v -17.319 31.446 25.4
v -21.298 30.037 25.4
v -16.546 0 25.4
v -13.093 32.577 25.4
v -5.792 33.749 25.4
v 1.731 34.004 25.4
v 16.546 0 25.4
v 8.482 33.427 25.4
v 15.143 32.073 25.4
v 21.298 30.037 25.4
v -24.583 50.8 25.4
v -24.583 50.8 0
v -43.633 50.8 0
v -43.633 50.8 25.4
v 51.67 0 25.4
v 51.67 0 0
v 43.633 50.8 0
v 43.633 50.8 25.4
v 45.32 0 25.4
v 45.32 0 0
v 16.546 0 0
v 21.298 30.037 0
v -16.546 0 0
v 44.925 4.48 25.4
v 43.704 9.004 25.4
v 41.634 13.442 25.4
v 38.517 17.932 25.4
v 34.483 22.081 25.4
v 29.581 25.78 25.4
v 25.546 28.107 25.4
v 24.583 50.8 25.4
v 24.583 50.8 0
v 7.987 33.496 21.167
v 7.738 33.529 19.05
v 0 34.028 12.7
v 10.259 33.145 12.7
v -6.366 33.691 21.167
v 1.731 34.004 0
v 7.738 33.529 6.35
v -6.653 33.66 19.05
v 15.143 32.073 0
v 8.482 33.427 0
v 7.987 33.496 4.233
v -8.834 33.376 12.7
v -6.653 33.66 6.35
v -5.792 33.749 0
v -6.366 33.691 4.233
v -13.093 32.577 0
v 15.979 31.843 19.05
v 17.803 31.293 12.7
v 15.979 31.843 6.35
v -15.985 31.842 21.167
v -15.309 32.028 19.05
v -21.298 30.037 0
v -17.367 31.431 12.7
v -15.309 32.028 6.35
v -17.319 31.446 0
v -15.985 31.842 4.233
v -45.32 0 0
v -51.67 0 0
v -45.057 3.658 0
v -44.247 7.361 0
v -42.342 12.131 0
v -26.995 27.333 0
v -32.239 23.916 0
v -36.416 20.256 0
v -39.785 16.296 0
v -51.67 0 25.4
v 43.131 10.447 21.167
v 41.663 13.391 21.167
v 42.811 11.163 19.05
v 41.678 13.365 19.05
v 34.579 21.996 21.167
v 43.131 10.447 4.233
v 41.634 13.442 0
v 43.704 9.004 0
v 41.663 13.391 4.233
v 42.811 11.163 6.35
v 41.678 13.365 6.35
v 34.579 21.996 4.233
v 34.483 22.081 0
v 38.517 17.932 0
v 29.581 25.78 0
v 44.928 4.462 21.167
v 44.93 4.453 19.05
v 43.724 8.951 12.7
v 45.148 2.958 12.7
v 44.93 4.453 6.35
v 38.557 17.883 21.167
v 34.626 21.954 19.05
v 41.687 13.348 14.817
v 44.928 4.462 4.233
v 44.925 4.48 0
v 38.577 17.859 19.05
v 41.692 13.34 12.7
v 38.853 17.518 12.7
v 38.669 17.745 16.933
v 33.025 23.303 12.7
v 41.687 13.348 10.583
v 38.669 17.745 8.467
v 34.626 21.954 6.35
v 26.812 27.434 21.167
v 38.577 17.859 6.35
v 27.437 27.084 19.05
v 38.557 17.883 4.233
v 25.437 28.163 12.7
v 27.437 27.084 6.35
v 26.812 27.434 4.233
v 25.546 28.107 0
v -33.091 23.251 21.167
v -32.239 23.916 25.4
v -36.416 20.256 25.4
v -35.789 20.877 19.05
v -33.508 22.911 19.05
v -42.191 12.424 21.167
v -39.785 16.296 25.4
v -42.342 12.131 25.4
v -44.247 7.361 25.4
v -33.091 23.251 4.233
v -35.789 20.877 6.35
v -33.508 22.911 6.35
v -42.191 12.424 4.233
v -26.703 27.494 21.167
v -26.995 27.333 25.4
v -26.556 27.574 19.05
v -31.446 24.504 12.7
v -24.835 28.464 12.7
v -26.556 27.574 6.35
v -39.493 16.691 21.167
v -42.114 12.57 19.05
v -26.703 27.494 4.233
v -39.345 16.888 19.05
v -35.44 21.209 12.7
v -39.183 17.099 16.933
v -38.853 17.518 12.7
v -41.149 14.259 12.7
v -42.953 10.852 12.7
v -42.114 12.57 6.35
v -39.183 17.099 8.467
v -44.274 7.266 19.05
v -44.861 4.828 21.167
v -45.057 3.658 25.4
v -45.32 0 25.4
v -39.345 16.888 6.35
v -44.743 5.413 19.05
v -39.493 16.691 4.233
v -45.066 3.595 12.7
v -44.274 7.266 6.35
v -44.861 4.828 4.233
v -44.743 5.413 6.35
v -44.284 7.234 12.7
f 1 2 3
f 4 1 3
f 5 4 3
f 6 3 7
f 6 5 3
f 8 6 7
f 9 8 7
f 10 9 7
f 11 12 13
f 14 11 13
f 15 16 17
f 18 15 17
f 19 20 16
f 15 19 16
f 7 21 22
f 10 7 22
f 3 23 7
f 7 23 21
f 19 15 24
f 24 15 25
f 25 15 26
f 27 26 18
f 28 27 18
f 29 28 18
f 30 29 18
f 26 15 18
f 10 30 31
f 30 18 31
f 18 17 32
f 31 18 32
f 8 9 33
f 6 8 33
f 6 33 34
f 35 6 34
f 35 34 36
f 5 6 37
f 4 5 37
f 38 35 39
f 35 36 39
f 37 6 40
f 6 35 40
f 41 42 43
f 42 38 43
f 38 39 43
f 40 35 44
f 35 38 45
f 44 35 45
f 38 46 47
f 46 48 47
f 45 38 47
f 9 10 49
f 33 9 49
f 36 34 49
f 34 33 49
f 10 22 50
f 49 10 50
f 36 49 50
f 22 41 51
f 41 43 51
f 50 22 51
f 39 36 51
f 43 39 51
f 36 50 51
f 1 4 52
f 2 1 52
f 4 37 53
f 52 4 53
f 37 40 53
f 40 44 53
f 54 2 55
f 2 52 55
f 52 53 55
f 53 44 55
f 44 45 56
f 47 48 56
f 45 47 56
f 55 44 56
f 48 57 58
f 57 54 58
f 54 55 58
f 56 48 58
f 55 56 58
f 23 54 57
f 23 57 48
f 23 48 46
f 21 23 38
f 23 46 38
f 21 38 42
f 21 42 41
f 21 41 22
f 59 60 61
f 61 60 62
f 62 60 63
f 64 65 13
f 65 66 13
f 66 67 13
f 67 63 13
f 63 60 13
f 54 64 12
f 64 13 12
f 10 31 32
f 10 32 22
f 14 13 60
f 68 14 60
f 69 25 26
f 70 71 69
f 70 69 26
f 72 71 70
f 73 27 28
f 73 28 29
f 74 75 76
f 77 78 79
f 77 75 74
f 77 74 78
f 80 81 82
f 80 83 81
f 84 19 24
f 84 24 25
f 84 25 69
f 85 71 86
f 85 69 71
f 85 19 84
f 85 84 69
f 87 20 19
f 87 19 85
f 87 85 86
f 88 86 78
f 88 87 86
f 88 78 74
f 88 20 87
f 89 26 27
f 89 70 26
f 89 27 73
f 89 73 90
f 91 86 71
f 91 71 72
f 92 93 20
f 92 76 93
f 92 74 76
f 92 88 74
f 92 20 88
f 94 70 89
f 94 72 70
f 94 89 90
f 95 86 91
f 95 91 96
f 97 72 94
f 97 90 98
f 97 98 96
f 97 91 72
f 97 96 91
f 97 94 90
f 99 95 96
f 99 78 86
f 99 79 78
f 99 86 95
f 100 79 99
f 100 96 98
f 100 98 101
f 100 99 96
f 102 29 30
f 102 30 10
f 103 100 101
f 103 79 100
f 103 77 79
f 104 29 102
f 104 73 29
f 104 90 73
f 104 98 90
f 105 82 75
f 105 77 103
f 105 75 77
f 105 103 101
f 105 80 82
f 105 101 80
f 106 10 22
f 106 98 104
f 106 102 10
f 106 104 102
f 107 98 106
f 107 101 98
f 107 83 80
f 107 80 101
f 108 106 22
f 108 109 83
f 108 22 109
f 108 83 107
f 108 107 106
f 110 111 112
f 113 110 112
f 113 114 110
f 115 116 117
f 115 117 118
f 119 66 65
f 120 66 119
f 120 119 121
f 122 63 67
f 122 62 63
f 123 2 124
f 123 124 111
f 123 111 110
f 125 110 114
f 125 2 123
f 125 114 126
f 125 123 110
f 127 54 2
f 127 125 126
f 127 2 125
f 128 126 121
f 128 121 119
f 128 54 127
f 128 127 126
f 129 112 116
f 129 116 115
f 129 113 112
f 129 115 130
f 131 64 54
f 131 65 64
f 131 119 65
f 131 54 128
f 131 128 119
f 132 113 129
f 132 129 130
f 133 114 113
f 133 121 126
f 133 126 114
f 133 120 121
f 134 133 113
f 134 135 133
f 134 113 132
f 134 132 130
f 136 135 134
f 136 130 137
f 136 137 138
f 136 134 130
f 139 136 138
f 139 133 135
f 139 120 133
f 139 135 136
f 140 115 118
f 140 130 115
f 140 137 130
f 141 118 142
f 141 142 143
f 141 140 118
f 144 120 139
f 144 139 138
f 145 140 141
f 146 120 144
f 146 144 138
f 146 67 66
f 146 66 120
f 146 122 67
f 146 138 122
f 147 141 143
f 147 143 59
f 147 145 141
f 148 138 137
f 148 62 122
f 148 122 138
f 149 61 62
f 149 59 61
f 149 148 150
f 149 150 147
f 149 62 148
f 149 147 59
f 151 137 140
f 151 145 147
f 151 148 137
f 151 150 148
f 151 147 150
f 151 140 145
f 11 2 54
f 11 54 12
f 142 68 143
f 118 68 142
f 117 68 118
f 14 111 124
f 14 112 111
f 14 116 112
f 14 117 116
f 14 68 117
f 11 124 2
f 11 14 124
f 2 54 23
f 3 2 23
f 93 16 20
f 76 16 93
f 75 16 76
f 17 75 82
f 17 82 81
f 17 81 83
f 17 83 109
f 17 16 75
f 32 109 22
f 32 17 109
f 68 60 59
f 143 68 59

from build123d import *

# Parameters (mm, degrees)
F1_DEPTH = 25.4


with BuildPart() as f1:
    # F0 (on Top) → F1 (new body)
    with BuildSketch(Plane.XY):
        with BuildLine():
            Line((-43.632869, 50.8), (-51.669617, 0))
            Line((-51.669617, 0), (-45.319617, 0))
            add(Edge.make_bspline(
                [(-21.298033, 30.036661), (-45.319617, 20.433774), (-45.319617, 0)],
                knots=[2.060032, 2.060032, 2.060032, 3.141593, 3.141593, 3.141593], degree=2, weights=[1, 0.857307, 1]))
            Line((-21.298033, 30.036661), (-24.582869, 50.8))
            Line((-24.582869, 50.8), (-43.632869, 50.8))
        make_face()
        with BuildLine():
            Line((-21.298033, 30.036661), (-16.546122, 0))
            Line((-16.546122, 0), (16.546122, 0))
            Line((16.546122, 0), (21.298033, 30.036661))
            add(Edge.make_bspline(
                [(21.298033, 30.036661), (0, 38.55078), (-21.298033, 30.036661)],
                knots=[1.08156, 1.08156, 1.08156, 2.060032, 2.060032, 2.060032], degree=2, weights=[1, 0.882692, 1]))
        make_face()
        with BuildLine():
            add(Edge.make_bspline(
                [(45.319617, 0), (45.319617, 20.433774), (21.298033, 30.036661)],
                knots=[0, 0, 0, 1.08156, 1.08156, 1.08156], degree=2, weights=[1, 0.857307, 1]))
            Line((45.319617, 0), (51.669617, 0))
            Line((51.669617, 0), (43.632869, 50.8))
            Line((43.632869, 50.8), (24.582869, 50.8))
            Line((24.582869, 50.8), (21.298033, 30.036661))
        make_face()
    extrude(amount=F1_DEPTH)


solid = f1.part
